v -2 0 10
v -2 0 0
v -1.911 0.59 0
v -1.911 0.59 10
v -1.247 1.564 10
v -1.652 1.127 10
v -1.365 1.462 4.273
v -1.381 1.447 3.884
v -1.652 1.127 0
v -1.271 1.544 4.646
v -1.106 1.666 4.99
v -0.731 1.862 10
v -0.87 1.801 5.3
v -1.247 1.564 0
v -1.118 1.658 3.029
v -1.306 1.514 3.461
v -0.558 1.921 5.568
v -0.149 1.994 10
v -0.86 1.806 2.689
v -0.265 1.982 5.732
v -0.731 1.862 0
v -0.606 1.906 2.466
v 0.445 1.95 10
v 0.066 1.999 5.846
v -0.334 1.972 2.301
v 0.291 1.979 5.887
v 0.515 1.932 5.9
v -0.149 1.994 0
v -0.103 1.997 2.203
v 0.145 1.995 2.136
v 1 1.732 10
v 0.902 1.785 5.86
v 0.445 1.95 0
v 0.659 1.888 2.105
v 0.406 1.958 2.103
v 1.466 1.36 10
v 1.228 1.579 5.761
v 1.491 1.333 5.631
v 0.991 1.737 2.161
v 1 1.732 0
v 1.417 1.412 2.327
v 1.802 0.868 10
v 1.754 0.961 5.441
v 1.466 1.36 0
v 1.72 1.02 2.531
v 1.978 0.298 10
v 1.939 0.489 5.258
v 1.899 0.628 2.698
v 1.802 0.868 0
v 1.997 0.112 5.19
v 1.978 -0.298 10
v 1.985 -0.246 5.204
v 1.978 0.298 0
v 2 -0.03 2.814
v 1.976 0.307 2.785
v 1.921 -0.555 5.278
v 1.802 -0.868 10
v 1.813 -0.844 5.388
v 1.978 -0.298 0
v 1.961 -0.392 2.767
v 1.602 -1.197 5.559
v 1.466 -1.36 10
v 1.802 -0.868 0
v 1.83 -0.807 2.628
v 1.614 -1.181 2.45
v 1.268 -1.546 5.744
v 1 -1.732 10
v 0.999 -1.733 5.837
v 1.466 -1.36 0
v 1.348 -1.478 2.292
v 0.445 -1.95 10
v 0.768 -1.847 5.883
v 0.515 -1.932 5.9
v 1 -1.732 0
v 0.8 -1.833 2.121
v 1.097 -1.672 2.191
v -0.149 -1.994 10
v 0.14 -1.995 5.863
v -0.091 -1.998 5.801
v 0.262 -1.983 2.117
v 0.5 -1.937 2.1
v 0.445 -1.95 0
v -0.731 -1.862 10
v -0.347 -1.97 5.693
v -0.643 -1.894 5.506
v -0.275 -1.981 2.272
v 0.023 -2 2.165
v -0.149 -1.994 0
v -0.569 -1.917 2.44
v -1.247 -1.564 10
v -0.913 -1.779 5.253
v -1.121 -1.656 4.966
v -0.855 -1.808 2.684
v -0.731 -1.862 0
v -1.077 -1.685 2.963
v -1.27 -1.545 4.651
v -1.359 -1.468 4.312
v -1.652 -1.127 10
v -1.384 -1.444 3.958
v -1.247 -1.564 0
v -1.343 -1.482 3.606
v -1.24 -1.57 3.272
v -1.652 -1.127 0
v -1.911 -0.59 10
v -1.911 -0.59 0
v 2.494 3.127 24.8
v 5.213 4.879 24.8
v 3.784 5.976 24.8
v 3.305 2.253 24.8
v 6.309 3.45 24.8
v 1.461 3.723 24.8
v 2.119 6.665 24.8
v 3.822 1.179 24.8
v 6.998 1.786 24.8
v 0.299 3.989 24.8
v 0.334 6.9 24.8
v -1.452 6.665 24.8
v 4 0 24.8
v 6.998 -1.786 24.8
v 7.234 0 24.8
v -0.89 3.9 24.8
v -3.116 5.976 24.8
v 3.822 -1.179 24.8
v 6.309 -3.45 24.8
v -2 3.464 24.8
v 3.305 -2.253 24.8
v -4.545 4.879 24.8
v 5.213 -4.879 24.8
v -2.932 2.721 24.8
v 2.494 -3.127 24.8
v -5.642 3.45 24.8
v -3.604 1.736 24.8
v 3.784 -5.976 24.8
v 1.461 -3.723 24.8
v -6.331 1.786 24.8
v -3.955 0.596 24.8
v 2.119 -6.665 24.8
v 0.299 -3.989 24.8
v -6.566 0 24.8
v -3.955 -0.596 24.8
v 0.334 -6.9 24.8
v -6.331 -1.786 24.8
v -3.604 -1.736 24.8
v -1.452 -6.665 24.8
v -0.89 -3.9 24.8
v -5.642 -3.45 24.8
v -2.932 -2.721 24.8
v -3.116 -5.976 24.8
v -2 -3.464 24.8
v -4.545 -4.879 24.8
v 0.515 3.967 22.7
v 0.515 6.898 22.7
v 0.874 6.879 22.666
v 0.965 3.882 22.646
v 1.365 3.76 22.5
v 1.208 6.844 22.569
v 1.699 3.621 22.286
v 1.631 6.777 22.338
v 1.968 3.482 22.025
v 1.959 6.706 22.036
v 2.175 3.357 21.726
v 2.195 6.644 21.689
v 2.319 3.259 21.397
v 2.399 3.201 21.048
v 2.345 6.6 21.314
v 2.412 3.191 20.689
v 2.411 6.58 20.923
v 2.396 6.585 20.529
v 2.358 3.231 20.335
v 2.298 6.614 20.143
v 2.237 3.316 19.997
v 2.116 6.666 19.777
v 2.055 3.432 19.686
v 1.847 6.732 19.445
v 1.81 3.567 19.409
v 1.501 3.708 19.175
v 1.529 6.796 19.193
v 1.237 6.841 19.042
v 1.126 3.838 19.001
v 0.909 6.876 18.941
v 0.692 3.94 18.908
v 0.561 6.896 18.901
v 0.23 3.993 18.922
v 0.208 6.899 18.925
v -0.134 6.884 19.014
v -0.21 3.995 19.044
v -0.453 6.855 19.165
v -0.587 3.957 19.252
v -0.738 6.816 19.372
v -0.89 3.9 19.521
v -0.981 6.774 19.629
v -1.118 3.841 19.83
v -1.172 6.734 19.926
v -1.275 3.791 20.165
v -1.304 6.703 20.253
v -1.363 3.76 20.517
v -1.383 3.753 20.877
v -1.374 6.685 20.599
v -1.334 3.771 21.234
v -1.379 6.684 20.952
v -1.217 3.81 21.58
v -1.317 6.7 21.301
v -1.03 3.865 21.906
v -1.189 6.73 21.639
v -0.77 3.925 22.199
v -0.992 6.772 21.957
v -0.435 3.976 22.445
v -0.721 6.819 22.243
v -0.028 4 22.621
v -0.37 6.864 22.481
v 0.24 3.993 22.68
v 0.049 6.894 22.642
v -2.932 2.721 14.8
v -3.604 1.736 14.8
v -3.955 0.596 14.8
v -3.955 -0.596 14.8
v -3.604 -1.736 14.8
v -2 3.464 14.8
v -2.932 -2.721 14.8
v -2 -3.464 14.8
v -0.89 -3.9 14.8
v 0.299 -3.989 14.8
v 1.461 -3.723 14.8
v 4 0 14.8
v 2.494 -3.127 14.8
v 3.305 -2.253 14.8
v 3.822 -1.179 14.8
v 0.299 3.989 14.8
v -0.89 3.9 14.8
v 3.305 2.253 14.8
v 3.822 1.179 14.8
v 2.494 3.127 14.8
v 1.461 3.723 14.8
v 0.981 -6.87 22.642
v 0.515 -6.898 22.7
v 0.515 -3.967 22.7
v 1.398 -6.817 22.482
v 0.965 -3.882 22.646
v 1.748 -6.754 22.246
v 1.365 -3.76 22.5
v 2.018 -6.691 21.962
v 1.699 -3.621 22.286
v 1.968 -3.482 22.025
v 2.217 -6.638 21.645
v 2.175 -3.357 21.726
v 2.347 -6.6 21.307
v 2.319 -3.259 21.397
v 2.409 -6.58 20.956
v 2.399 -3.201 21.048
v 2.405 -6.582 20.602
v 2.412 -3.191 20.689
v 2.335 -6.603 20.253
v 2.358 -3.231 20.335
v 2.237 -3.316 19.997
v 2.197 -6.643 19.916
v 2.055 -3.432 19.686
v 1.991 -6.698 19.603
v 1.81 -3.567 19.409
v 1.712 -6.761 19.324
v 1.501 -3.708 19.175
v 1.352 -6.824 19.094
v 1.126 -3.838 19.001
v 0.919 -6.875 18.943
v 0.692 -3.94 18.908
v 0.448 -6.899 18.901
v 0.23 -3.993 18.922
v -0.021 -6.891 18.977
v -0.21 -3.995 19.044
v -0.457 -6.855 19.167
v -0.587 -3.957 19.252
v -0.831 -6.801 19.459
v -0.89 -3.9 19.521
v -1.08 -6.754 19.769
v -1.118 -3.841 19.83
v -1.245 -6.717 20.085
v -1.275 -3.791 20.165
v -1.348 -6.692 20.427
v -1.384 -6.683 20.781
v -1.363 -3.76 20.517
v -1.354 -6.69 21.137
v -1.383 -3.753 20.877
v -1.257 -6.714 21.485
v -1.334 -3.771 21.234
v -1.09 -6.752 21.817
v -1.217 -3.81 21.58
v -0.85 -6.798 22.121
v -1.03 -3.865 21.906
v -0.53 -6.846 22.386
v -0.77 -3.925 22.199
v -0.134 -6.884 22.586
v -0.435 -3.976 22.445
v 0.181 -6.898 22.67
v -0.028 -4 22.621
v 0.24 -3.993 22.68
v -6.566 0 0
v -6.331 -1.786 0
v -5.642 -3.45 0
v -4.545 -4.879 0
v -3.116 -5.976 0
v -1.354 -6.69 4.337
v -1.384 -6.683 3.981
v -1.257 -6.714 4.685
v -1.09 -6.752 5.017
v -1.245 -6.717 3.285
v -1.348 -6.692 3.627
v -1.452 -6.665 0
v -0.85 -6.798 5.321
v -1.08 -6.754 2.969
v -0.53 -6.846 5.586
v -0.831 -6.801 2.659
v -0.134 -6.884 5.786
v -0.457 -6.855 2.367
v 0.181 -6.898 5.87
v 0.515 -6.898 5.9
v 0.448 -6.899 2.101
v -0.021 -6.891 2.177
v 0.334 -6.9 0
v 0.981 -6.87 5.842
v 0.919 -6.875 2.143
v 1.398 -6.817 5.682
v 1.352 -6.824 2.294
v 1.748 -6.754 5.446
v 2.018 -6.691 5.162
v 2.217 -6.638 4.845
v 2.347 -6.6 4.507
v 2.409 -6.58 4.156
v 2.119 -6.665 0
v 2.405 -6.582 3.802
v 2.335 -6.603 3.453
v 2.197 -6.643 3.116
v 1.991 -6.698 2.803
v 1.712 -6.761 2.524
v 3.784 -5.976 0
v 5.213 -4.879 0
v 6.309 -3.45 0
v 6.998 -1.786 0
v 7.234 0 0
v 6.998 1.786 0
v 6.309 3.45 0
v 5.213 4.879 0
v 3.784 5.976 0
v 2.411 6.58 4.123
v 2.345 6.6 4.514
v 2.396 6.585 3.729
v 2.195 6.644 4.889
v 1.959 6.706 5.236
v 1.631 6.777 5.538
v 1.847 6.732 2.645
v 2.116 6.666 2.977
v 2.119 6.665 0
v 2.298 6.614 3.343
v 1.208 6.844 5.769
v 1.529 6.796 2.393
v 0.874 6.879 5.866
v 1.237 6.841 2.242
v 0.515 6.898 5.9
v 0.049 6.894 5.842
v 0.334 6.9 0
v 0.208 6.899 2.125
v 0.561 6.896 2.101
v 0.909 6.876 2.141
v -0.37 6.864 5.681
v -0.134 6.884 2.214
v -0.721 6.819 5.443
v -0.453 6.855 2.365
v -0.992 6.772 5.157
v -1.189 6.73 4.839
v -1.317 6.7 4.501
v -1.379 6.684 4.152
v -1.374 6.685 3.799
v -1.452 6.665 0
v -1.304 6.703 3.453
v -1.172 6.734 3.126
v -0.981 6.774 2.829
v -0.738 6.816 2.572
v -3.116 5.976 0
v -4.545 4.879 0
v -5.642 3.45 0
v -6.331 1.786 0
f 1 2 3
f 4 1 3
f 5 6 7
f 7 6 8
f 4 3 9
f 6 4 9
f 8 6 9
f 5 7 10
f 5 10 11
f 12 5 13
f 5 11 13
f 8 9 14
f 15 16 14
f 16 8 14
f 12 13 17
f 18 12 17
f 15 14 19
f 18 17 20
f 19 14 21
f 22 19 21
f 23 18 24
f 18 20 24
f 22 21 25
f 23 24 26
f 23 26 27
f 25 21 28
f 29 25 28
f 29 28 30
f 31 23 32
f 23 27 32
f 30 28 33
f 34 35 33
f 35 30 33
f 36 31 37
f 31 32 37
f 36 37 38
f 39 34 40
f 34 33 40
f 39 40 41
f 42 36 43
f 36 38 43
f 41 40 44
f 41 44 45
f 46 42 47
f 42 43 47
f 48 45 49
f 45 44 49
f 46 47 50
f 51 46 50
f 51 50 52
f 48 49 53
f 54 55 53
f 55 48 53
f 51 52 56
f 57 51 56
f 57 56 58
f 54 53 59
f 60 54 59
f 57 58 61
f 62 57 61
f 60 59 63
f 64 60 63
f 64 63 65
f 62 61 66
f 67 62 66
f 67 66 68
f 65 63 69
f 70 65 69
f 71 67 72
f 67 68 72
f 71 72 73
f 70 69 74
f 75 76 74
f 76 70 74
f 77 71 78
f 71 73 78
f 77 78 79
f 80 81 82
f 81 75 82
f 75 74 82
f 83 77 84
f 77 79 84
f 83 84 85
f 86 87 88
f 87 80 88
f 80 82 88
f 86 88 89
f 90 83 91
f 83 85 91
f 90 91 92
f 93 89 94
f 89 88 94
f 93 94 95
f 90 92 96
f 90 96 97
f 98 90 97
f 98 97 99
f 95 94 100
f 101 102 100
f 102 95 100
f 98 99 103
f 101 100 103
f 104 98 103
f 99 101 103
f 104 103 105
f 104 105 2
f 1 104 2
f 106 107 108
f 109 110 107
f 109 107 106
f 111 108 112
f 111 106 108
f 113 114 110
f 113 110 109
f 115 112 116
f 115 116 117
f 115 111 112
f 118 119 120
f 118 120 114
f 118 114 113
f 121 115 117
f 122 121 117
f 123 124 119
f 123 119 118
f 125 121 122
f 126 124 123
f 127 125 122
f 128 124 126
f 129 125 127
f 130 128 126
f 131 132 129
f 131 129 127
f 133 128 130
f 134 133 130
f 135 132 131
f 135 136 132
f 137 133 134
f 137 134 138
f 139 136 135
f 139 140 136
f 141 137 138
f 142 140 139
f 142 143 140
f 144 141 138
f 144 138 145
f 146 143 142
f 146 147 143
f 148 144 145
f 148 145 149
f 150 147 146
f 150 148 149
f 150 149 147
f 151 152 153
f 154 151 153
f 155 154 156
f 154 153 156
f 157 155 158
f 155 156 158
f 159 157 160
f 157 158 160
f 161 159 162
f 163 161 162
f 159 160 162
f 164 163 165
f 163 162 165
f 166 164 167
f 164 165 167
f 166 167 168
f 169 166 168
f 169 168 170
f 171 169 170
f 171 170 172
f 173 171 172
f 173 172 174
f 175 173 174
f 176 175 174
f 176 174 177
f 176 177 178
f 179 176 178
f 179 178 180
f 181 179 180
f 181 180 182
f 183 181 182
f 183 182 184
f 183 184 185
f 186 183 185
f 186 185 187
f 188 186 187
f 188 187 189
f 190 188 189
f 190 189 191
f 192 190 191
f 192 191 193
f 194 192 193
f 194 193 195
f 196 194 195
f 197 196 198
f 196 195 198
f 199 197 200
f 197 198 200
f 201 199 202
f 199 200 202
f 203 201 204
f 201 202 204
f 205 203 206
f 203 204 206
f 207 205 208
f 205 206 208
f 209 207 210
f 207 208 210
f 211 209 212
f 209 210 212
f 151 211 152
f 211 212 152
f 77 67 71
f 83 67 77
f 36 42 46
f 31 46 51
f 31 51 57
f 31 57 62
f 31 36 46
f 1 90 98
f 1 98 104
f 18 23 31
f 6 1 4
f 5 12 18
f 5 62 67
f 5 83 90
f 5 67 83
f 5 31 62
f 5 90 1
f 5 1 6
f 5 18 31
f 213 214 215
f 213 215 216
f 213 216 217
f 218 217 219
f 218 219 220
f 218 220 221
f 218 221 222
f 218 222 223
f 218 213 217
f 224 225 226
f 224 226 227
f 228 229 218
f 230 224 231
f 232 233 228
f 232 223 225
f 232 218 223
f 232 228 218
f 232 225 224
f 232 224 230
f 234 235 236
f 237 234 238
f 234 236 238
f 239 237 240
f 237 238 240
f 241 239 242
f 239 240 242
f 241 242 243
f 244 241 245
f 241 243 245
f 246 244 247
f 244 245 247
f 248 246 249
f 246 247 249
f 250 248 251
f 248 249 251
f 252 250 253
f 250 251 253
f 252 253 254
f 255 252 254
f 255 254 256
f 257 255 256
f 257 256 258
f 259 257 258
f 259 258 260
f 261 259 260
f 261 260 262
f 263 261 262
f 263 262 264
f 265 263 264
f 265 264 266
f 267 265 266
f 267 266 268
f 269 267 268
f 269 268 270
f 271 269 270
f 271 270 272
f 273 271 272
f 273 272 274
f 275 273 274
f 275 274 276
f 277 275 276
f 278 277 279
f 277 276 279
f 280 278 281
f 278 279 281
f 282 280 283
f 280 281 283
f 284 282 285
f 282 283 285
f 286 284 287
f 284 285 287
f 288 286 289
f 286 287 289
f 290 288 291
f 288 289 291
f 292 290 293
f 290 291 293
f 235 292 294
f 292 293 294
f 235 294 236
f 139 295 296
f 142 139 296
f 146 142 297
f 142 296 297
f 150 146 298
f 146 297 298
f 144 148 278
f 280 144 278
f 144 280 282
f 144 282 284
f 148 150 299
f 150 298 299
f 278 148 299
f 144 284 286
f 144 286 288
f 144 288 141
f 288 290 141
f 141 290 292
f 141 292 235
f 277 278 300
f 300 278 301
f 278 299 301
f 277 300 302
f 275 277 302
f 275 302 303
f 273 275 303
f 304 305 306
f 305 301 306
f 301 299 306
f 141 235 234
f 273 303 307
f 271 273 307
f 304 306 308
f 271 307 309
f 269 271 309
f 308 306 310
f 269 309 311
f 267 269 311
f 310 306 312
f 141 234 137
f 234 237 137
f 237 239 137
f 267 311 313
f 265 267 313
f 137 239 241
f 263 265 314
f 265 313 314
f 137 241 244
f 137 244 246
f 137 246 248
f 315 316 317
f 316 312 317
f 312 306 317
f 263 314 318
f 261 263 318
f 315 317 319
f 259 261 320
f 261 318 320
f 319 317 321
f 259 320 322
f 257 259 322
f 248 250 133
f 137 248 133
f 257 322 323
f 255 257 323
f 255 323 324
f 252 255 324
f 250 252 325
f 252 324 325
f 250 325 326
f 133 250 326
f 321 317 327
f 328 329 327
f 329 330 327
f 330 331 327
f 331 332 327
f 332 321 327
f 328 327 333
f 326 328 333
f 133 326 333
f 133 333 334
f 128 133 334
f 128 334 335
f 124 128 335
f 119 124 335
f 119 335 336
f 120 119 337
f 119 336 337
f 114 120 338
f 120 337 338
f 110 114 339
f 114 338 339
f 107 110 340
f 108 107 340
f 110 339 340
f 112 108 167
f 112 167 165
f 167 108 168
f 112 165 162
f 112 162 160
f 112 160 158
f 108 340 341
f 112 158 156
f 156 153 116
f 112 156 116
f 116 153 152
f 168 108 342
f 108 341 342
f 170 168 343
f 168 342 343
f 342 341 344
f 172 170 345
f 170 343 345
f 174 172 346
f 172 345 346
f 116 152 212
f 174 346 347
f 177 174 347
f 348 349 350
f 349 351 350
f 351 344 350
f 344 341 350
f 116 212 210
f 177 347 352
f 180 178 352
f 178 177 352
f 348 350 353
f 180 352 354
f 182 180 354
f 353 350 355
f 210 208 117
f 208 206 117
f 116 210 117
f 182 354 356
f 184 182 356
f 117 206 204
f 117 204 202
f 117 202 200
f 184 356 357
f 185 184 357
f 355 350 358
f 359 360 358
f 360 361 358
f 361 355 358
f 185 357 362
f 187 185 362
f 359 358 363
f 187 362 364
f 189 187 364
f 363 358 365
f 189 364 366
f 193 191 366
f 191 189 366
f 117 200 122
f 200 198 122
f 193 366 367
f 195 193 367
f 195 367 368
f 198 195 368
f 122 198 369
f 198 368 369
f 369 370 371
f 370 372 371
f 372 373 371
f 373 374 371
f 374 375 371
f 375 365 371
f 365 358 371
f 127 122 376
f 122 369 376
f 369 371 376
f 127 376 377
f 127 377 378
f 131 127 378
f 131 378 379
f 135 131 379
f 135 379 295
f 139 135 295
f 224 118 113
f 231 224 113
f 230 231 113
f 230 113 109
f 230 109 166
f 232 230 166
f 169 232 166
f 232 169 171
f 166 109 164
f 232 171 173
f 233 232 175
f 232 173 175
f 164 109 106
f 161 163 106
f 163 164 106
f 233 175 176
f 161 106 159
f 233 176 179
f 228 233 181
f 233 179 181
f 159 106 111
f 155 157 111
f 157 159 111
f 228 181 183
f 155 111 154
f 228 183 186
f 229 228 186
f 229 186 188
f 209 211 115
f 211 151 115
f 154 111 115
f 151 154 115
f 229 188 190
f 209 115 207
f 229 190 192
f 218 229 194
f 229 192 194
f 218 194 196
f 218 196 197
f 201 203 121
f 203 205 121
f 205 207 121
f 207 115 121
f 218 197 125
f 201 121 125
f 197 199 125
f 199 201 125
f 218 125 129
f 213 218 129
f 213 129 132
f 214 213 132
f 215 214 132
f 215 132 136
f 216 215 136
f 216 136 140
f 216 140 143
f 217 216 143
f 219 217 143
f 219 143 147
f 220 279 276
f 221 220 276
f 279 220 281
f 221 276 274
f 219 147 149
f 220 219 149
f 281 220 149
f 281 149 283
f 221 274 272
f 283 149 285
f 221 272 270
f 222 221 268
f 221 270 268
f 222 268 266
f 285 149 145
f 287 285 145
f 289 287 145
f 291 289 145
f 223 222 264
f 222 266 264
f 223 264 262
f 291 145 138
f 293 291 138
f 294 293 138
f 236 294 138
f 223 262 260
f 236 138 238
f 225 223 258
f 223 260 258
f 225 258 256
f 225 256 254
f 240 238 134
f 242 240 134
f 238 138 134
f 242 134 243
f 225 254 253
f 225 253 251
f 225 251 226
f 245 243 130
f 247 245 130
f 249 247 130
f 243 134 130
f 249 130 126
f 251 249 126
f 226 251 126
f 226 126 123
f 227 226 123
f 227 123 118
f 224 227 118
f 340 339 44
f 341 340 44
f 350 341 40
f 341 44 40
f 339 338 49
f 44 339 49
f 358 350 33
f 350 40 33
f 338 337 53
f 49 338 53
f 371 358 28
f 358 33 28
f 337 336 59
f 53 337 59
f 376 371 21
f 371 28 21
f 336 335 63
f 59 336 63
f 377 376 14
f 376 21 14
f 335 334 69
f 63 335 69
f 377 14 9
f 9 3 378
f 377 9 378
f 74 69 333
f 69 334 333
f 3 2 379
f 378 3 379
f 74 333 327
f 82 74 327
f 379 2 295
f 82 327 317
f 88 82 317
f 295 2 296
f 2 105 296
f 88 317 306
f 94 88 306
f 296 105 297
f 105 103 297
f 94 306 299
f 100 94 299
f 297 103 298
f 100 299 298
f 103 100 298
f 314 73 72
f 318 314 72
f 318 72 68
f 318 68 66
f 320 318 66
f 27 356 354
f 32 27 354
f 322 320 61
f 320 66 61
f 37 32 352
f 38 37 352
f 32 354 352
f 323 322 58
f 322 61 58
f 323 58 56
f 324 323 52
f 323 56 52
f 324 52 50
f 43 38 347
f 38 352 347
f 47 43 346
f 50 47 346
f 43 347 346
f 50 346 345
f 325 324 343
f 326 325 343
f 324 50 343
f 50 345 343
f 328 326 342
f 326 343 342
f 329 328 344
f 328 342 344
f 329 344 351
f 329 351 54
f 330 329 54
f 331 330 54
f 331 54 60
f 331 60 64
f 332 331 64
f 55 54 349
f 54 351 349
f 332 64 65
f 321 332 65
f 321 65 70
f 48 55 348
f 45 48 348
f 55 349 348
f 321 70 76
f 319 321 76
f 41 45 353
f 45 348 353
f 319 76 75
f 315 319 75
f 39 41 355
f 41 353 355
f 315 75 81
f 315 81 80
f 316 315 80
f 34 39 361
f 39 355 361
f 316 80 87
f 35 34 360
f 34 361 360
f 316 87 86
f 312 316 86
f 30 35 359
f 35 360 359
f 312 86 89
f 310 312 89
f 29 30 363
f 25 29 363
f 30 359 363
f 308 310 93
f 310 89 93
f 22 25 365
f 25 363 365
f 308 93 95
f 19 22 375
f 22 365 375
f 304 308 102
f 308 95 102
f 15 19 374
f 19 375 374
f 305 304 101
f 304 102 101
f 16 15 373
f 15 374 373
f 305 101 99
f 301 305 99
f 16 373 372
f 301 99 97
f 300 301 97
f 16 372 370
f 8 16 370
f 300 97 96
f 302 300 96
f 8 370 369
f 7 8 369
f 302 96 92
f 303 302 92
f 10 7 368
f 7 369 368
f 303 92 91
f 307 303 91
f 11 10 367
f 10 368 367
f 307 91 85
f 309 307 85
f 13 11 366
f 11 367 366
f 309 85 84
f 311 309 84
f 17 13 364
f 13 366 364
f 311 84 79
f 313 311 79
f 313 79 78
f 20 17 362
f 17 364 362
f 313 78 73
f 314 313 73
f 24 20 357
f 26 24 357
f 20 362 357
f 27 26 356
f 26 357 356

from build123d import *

# Parameters (mm, degrees)
SKETCH1_R           = 6.9
BOSS_EXTRUDE1_DEPTH = 24.8
SKETCH2_R           = 1.9
CUT_EXTRUDE1_DEPTH  = 24.8
SKETCH3_R           = 4
CUT_EXTRUDE2_DEPTH  = 10
SKETCH4_R           = 2
CUT_EXTRUDE3_DEPTH  = 10


with BuildPart() as part:
    # Sketch1 → Boss-Extrude1 (new body)
    with BuildSketch(Plane.XY):
        with Locations(Location((0.333575811, 0, 0), (0, 0, 180))):
            Circle(SKETCH1_R)
    extrude(amount=BOSS_EXTRUDE1_DEPTH)

    # Sketch2 → Cut-Extrude1 (cut)
    with BuildSketch(Plane(origin=(0, 6.9, 0), x_dir=(1, 0, 0), z_dir=(0, 1, 0))):
        with Locations(Location((0.515412316, -4, 0), (0, 0, 270))):
            Circle(SKETCH2_R)
        with Locations(Location((0.515412316, -20.8, 0), (0, 0, 270))):
            Circle(SKETCH2_R)
    extrude(amount=-CUT_EXTRUDE1_DEPTH, mode=Mode.SUBTRACT)

    # Sketch3 → Cut-Extrude2 (cut)
    with BuildSketch(Plane.XY.offset(24.8)):
        Circle(SKETCH3_R)
    extrude(amount=-CUT_EXTRUDE2_DEPTH, mode=Mode.SUBTRACT)

    # Sketch4 → Cut-Extrude3 (cut)
    with BuildSketch(Plane(origin=(0, 0, 0), x_dir=(-1, 0, 0), z_dir=(0, 0, -1))):
        Circle(SKETCH4_R)
    extrude(amount=-CUT_EXTRUDE3_DEPTH, mode=Mode.SUBTRACT)


solid = part.part
